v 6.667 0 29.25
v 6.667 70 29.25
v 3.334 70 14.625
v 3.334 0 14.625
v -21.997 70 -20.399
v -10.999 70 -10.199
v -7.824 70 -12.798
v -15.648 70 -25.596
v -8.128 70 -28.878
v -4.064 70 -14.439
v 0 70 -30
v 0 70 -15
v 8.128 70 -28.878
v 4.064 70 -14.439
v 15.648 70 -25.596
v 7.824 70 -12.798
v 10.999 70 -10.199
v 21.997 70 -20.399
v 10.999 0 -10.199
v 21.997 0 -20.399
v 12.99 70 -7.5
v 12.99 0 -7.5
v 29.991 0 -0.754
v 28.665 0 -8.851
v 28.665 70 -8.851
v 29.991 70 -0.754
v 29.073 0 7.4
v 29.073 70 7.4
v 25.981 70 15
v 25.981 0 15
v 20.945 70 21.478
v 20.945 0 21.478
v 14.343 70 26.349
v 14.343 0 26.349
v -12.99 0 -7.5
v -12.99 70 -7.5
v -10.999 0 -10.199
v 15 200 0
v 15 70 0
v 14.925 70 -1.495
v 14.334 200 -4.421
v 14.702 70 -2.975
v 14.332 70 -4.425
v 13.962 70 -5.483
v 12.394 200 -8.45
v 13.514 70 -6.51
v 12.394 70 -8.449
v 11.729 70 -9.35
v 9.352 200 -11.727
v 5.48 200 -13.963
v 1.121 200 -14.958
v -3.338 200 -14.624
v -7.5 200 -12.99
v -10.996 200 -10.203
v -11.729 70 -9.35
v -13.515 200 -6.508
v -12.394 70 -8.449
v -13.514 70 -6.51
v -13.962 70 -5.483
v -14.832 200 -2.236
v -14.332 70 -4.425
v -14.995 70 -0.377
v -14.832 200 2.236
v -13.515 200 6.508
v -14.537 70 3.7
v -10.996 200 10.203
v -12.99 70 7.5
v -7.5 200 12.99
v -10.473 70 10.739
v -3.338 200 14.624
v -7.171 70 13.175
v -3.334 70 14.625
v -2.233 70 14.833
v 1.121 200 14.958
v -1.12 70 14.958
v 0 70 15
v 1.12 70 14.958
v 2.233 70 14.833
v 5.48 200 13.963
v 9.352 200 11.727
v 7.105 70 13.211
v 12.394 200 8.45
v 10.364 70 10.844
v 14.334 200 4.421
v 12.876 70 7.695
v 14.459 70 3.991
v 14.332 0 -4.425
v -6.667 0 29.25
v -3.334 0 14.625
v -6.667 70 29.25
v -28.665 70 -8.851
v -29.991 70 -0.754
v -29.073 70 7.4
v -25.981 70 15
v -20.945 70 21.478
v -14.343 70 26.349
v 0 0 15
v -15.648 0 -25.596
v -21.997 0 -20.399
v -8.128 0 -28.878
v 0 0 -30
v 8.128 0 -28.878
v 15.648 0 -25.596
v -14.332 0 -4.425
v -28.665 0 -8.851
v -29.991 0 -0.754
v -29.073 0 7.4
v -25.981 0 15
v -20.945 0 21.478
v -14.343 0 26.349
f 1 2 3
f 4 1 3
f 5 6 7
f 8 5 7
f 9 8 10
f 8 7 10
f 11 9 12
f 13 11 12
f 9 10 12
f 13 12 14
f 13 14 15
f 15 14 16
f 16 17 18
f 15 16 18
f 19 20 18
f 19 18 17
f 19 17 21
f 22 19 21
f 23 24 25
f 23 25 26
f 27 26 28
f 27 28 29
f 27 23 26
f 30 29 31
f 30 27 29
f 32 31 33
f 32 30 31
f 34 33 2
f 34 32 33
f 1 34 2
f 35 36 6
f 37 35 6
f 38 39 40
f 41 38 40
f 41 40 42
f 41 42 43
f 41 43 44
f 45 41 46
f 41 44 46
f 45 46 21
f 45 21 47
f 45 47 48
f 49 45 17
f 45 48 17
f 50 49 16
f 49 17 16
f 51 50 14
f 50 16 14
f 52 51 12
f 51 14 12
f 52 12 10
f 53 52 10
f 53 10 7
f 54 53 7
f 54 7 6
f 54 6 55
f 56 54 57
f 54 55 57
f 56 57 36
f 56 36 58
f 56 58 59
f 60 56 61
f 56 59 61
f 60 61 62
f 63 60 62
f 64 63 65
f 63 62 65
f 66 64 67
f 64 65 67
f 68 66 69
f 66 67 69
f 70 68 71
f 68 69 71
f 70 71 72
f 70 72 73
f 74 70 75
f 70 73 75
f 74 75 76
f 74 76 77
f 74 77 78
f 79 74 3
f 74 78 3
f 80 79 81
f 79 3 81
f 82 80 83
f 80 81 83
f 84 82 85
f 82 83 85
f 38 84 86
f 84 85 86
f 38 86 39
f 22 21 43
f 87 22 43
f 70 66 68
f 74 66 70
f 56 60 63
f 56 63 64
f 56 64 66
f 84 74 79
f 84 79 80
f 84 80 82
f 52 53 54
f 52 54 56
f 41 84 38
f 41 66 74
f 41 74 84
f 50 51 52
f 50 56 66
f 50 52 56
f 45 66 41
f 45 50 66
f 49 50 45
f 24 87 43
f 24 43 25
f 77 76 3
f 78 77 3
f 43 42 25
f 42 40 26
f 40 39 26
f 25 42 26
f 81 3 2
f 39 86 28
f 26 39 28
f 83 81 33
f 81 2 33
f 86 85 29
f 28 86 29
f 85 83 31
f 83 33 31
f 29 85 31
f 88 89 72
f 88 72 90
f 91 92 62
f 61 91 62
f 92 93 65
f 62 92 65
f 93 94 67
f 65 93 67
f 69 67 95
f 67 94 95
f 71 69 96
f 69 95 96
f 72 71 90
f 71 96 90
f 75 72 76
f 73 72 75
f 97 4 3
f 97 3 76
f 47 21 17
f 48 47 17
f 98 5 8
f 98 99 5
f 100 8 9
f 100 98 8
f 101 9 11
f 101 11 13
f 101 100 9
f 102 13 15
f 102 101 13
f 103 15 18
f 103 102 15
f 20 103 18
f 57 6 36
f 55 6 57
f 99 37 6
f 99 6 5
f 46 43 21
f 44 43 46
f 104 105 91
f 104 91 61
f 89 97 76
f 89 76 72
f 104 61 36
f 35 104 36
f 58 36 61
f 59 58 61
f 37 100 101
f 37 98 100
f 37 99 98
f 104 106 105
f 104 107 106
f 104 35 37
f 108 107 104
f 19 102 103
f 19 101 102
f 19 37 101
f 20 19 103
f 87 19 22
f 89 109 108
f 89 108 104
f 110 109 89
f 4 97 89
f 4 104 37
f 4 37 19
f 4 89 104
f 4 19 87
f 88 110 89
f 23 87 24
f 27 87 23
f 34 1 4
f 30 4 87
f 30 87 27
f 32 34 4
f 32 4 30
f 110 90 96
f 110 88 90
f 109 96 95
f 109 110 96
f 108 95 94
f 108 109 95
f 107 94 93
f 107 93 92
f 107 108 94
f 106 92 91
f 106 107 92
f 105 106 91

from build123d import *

# Parameters (mm, degrees)
SKETCH1_R           = 15
BOSS_EXTRUDE1_DEPTH = 200
SKETCH2_R           = 30
SKETCH2_R_2         = 15
BOSS_EXTRUDE2_DEPTH = 70
CUT_EXTRUDE1_DEPTH  = 84
CIRPATTERN2_COUNT   = 3


with BuildPart() as part:
    # Sketch1 → Boss-Extrude1 (new body)
    with BuildSketch(Plane(origin=(0, 0, 0), x_dir=(1, 0, 0), z_dir=(0, 1, 0))):
        Circle(SKETCH1_R)
    extrude(amount=BOSS_EXTRUDE1_DEPTH)

    # Sketch2 → Boss-Extrude2 (add)
    with BuildSketch(Plane.XZ):
        Circle(SKETCH2_R)
        Circle(SKETCH2_R_2, mode=Mode.SUBTRACT)
    extrude(amount=-BOSS_EXTRUDE2_DEPTH)

    # Sketch3 → Cut-Extrude1 (cut)
    with BuildSketch(Plane(origin=(0, 70, 0), x_dir=(1, 0, 0), z_dir=(0, 1, 0))):
        Polygon((-3.333611713, -14.624877194), (-7.415359219, -32.531898508), (7.415359219, -32.531898508), (3.333611713, -14.624877194), (0, -15), align=None)
    cut_extrude1 = extrude(amount=-CUT_EXTRUDE1_DEPTH, mode=Mode.SUBTRACT)

    # CirPattern2: Cut-Extrude1 ×3 about axis
    cirpattern2_axis = Axis((0, 0, 0), (0, 1, 0))
    for i in range(1, CIRPATTERN2_COUNT):
        add(cut_extrude1.rotate(cirpattern2_axis, i * 360 / CIRPATTERN2_COUNT), mode=Mode.SUBTRACT)


solid = part.part
